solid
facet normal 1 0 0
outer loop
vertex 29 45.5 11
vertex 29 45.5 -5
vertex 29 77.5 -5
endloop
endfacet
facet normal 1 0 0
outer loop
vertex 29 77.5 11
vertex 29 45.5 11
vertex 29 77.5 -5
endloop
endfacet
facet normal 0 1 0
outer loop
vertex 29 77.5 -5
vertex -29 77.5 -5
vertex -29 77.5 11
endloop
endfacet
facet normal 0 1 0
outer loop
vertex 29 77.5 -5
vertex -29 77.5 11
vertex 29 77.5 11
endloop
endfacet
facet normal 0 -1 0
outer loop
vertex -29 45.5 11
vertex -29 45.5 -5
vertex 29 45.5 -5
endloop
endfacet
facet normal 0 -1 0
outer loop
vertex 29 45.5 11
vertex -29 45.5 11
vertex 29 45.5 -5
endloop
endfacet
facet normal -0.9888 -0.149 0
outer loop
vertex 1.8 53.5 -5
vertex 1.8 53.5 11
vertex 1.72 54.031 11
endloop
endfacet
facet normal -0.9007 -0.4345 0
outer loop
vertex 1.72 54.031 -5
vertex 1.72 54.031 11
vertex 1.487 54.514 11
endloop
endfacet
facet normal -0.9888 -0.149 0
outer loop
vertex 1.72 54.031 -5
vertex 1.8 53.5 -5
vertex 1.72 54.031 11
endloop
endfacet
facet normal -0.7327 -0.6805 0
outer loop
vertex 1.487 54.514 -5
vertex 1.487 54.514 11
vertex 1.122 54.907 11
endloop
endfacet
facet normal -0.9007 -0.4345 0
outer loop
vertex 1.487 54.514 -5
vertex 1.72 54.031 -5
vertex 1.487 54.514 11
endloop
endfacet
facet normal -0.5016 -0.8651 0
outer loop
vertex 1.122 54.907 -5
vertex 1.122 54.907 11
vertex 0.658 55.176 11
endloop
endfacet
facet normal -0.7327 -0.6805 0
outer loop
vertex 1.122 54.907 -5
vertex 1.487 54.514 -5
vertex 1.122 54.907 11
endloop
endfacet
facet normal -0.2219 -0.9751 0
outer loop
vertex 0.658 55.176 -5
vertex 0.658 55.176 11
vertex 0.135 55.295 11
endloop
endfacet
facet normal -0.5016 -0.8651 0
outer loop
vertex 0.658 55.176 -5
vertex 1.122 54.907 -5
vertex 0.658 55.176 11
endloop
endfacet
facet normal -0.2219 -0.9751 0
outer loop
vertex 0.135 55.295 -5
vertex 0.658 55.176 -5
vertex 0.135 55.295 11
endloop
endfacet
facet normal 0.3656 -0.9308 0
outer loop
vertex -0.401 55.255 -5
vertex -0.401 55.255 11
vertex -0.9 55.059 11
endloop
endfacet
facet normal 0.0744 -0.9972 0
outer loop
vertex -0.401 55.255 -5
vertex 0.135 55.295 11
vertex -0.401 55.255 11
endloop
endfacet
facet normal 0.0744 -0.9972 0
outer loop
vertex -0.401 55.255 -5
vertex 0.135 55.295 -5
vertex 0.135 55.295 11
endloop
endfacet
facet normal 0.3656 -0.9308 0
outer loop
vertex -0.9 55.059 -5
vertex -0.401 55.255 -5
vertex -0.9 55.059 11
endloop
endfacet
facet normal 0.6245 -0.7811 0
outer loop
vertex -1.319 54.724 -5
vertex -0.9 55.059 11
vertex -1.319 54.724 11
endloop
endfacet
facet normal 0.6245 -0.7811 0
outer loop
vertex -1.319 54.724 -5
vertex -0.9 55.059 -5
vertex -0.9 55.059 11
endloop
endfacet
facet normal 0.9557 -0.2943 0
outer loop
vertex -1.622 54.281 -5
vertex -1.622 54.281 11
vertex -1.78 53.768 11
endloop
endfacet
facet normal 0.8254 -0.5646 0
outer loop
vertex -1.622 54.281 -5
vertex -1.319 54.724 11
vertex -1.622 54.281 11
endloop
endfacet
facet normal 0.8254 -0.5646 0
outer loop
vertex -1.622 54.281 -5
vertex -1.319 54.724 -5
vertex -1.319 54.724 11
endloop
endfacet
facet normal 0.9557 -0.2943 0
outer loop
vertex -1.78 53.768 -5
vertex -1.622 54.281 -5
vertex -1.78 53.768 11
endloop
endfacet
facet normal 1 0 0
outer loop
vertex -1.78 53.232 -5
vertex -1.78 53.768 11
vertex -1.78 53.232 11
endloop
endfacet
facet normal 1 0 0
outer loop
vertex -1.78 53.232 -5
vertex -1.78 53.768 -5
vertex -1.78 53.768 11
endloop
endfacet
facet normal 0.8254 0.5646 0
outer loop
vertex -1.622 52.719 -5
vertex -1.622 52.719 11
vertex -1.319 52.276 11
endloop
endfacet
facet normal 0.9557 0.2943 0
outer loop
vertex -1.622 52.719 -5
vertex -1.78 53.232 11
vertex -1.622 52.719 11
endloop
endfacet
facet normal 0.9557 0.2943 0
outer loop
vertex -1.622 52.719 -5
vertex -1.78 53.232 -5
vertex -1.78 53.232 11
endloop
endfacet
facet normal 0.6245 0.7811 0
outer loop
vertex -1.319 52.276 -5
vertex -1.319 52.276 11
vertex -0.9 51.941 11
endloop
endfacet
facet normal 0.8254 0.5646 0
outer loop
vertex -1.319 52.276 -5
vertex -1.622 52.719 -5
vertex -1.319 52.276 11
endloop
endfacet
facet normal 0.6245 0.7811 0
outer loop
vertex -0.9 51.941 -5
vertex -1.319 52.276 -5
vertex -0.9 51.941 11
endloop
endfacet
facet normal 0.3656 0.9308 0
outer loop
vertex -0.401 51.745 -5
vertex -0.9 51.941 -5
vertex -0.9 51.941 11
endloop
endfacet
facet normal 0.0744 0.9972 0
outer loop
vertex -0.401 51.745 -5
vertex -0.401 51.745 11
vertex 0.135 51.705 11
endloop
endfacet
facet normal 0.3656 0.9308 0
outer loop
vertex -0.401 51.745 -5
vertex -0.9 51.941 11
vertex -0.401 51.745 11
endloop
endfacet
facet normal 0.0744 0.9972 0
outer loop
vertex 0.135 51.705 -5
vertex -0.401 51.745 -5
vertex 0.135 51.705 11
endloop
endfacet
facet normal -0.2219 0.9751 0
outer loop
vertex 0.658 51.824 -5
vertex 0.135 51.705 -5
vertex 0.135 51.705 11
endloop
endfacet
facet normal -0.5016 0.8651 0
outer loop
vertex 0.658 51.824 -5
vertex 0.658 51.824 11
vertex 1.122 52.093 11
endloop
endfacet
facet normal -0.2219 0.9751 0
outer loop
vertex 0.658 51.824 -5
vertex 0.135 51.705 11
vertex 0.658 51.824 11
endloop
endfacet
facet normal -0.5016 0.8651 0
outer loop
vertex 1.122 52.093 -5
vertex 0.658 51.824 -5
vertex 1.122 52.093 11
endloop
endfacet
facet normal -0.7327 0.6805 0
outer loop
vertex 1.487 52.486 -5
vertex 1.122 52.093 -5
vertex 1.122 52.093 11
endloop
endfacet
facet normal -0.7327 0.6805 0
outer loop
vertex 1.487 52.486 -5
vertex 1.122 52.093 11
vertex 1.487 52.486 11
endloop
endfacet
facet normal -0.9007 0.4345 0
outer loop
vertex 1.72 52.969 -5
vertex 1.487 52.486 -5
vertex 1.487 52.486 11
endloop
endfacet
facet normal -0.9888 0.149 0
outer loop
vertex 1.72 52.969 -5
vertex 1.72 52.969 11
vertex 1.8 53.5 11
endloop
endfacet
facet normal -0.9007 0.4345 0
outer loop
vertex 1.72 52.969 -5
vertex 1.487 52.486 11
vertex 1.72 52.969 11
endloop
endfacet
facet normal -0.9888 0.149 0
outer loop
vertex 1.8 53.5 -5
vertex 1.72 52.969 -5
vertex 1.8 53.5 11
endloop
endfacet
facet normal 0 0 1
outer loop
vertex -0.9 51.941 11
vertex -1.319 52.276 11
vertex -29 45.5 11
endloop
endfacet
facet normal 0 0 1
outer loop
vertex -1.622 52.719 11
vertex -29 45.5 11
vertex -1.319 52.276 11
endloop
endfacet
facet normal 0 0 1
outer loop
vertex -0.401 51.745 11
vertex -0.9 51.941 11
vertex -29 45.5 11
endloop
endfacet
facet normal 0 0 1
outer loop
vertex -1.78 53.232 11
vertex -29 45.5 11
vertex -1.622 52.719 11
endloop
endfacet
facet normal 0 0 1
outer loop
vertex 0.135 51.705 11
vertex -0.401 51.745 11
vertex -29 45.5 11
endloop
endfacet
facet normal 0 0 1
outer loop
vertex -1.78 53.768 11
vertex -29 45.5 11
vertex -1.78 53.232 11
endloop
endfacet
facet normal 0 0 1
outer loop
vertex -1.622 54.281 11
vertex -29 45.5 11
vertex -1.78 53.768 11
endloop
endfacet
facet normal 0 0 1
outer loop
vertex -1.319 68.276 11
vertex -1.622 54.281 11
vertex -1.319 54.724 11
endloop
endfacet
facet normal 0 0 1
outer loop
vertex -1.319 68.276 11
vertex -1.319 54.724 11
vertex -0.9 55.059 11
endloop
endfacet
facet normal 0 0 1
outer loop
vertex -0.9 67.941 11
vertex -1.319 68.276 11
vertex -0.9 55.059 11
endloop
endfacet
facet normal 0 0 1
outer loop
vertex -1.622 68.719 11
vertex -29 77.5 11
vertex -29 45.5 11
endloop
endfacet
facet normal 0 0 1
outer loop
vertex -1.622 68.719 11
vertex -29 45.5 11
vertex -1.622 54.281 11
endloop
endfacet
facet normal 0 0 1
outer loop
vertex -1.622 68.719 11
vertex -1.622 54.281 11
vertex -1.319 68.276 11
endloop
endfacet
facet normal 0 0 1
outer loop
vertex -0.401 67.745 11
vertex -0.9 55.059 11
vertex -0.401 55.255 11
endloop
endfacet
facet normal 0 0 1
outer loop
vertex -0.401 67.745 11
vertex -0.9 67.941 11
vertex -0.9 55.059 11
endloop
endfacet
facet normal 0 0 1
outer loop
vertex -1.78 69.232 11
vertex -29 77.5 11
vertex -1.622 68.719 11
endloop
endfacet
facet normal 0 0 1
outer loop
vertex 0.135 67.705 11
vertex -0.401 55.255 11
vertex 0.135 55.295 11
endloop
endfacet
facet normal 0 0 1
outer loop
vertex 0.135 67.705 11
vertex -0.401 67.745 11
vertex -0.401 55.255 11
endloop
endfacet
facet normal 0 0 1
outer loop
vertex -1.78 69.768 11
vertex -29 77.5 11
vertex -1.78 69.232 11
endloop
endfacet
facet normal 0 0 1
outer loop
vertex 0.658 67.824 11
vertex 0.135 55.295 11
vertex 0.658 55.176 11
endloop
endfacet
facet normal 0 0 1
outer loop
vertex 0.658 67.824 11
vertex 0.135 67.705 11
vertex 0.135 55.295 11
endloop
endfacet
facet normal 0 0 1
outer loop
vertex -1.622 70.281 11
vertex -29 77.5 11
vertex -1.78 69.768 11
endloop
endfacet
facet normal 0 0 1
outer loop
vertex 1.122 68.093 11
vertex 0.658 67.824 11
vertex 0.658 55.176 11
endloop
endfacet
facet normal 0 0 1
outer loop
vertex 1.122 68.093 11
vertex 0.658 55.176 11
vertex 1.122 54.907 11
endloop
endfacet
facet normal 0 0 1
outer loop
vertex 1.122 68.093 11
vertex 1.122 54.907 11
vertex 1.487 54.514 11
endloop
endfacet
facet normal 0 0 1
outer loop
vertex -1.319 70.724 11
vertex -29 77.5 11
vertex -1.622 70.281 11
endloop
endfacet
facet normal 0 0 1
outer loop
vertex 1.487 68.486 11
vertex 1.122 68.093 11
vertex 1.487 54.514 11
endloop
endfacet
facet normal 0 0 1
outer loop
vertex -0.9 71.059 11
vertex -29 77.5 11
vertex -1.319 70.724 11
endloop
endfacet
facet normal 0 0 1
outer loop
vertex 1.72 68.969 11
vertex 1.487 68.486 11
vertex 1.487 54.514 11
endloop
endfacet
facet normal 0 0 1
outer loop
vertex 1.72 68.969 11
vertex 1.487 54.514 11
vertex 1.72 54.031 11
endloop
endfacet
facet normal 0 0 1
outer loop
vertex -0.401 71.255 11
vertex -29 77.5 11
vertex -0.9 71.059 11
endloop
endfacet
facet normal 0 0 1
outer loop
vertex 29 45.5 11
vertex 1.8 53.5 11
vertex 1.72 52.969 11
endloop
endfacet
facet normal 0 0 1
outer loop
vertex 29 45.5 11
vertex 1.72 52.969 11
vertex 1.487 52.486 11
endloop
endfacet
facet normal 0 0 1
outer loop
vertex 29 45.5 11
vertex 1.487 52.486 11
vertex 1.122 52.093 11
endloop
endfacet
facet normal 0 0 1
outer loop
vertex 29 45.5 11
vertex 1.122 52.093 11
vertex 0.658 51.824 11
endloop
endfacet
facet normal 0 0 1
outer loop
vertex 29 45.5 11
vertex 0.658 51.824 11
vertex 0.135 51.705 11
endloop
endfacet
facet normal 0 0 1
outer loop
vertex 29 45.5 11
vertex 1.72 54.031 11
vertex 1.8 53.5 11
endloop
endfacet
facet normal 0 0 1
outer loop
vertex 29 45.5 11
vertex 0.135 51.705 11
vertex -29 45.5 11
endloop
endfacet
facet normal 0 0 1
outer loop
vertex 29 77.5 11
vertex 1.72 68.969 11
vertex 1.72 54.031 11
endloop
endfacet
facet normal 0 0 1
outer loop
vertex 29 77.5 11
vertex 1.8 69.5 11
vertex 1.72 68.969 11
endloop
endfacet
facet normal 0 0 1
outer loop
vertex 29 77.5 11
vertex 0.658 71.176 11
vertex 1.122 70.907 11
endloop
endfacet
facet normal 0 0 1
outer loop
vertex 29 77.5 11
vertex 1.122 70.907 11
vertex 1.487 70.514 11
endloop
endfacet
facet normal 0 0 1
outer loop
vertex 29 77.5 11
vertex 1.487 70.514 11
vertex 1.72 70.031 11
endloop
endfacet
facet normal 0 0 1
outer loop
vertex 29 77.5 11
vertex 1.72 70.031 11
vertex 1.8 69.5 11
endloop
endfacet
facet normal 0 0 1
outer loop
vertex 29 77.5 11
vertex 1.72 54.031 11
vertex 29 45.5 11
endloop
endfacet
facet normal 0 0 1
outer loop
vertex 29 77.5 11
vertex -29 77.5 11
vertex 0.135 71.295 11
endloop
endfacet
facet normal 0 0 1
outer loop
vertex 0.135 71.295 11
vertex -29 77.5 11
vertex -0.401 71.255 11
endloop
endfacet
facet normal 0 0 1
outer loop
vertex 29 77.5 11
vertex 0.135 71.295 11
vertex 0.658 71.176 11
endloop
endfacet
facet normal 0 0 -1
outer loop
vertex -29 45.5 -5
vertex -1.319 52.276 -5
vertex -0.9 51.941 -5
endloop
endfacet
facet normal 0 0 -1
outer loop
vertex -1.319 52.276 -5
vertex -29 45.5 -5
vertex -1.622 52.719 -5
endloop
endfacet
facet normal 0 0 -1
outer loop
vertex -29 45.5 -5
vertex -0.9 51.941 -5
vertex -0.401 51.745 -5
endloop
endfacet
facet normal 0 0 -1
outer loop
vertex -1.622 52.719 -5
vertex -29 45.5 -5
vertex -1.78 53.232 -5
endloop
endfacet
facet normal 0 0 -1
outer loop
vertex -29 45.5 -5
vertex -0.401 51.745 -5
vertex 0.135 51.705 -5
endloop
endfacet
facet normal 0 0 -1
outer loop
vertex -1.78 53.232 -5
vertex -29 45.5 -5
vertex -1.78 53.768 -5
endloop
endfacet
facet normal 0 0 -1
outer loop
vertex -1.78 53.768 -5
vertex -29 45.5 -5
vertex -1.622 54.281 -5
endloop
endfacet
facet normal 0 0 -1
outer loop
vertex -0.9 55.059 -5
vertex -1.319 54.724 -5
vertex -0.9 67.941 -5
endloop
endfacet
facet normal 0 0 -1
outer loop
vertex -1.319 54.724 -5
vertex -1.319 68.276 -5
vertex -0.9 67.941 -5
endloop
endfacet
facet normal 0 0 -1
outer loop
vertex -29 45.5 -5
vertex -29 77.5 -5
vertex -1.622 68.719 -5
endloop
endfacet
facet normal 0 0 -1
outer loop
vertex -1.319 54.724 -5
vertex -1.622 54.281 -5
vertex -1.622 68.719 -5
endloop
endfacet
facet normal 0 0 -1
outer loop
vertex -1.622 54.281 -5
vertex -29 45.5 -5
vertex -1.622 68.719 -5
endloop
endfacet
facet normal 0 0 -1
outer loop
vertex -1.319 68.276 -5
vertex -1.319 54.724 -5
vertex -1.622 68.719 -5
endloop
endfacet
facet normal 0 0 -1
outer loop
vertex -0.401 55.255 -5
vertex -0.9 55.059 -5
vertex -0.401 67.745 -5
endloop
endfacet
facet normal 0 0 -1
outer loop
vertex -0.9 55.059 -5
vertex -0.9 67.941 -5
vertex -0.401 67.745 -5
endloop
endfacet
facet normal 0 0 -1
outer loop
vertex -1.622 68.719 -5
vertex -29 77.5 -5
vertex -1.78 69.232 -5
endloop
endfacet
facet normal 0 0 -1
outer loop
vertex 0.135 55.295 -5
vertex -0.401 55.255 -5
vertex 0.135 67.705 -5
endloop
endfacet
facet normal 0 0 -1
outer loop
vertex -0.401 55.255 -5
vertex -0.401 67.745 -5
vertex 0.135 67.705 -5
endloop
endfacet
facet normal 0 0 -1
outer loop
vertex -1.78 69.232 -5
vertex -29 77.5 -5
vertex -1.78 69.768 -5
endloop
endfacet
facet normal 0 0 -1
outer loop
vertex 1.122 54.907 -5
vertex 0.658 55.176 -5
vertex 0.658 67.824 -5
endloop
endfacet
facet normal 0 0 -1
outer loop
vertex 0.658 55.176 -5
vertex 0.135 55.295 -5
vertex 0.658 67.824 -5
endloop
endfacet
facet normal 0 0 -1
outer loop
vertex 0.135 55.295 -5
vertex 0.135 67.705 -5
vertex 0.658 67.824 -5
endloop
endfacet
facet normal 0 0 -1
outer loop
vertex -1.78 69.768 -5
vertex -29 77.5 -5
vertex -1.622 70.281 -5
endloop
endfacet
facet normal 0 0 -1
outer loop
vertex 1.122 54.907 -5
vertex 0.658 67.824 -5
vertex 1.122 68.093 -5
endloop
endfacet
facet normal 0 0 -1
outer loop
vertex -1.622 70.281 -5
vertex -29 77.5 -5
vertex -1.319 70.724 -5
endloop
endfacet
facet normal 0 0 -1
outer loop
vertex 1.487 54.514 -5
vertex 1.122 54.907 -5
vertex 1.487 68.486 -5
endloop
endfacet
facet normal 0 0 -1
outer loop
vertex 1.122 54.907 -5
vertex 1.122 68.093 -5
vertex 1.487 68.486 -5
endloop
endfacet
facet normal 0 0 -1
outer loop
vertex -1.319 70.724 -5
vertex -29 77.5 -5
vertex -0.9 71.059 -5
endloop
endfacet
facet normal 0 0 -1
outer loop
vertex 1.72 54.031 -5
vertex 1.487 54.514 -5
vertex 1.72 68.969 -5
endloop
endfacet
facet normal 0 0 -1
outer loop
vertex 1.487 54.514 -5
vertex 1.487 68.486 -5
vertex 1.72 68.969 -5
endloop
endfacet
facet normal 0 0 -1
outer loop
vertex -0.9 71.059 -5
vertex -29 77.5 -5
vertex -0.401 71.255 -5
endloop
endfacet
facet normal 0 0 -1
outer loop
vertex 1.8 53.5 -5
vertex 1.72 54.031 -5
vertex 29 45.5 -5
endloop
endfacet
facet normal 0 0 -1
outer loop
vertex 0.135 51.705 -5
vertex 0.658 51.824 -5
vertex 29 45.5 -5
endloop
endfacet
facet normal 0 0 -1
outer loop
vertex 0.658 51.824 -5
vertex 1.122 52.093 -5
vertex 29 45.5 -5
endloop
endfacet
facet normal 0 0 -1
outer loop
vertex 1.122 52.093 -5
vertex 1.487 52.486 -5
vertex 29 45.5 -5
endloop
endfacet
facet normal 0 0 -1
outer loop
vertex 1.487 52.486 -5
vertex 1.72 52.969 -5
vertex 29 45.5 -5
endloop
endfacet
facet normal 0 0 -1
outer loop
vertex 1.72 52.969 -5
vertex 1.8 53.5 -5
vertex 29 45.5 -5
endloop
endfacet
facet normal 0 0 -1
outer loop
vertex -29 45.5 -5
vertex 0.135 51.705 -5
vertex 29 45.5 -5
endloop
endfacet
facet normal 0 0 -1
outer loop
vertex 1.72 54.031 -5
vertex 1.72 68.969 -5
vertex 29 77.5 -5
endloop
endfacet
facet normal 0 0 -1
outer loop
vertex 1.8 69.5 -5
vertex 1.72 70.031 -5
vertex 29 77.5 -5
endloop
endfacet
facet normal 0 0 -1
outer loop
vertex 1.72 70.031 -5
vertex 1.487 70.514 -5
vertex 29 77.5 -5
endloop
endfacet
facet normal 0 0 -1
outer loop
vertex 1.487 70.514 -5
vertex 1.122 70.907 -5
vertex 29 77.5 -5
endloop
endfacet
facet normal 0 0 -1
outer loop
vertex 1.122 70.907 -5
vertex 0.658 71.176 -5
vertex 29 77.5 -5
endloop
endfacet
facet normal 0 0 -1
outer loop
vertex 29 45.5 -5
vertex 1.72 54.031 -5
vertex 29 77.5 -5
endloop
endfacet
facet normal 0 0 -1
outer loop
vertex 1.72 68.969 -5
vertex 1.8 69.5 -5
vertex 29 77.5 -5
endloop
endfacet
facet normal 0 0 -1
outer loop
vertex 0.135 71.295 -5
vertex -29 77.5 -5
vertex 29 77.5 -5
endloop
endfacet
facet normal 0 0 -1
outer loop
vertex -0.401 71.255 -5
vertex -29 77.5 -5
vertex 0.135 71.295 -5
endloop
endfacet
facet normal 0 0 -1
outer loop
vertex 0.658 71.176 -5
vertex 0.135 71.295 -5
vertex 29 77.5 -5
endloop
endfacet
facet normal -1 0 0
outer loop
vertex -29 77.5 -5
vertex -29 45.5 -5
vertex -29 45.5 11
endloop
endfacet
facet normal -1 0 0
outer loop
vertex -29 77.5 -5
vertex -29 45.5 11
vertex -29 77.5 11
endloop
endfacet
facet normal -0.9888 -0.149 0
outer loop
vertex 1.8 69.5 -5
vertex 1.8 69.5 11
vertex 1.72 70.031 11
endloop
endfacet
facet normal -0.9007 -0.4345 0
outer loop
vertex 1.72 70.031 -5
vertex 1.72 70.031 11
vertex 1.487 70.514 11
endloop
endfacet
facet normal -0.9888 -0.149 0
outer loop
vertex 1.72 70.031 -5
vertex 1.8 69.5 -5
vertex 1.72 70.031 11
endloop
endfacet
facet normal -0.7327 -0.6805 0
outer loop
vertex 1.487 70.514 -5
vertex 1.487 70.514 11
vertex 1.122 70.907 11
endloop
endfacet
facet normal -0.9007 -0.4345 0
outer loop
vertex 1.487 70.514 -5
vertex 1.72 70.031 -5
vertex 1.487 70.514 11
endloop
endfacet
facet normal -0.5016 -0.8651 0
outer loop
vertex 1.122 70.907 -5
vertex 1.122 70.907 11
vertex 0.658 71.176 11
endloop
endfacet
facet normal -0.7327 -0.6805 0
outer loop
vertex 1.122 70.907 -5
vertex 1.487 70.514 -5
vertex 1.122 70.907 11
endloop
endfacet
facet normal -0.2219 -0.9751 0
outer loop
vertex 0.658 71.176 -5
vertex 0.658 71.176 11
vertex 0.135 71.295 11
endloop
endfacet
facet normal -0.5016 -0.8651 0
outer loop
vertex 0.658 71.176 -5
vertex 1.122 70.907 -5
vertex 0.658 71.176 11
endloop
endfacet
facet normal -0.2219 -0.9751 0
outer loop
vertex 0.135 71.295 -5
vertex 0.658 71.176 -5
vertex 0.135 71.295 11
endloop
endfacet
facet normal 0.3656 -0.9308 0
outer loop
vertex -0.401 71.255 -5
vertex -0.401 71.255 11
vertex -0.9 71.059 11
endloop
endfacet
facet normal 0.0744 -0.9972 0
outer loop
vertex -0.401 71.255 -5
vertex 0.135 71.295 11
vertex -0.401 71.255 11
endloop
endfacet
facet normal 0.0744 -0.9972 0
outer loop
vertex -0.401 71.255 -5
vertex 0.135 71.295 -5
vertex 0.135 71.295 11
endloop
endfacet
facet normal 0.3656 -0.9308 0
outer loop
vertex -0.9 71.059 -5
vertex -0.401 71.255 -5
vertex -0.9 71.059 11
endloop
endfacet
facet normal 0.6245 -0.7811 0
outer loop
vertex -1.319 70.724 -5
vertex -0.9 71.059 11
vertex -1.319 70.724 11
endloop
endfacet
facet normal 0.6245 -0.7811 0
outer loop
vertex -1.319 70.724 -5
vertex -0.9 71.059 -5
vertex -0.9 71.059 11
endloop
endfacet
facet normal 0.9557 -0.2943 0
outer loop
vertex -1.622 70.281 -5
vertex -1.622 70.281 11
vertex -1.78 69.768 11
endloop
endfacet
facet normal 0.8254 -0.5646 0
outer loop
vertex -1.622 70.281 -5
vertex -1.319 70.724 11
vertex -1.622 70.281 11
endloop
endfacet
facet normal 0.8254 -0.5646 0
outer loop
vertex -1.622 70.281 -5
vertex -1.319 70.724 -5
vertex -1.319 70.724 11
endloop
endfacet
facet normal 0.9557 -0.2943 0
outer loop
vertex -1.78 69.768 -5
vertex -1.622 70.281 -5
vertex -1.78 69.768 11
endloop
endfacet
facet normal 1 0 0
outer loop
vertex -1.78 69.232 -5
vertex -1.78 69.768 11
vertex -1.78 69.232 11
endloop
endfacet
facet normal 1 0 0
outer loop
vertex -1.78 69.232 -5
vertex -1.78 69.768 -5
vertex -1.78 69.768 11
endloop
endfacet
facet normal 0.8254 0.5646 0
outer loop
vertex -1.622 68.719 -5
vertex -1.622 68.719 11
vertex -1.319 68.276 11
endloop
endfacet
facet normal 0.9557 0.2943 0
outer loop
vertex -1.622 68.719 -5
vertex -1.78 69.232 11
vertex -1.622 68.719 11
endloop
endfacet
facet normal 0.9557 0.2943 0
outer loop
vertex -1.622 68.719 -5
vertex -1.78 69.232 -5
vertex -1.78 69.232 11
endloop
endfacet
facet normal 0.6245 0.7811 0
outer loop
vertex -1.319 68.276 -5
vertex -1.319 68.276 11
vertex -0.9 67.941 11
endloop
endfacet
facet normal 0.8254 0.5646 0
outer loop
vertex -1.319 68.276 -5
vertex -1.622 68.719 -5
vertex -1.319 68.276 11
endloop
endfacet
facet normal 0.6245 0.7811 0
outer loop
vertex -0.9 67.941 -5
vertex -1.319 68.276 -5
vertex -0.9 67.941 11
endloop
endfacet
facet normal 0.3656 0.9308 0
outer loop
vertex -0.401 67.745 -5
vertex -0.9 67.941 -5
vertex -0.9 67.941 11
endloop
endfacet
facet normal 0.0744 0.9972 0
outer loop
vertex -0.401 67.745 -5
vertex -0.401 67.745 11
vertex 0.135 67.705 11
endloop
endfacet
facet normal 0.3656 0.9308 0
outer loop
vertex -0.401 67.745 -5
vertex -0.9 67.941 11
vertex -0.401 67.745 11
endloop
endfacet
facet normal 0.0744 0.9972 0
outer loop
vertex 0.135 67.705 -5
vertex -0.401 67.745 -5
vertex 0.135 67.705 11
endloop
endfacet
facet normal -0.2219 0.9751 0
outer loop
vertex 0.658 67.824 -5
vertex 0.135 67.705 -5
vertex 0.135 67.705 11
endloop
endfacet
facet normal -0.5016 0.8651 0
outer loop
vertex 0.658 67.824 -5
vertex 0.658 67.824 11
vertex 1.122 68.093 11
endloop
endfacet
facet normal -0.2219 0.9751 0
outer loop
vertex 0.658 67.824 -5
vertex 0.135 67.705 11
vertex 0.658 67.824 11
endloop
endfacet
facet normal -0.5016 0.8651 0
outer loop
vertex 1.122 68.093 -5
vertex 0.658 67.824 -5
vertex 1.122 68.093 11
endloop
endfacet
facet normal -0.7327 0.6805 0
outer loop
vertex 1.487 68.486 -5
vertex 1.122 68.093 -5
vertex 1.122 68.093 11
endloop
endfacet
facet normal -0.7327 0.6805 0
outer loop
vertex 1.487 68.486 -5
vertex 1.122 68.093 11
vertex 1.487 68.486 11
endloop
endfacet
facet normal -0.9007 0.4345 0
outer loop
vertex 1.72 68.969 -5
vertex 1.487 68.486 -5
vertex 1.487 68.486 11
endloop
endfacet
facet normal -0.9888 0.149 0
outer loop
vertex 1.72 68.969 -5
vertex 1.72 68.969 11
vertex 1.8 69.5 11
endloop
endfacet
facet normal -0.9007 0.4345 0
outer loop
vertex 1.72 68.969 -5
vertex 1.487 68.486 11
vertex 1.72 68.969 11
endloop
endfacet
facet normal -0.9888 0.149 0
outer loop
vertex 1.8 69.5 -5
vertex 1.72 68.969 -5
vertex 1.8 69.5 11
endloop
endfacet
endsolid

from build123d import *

# Parameters (mm, degrees)
CYLINDER003_R     = 1.8
CYLINDER003_DEPTH = 50
ARRAY001_Y_COUNT  = 2
ARRAY001_Y_PITCH  = 16
BOX_W             = 58
BOX_H             = 32
BOX_DEPTH         = 16


with BuildPart() as bolt_hole_array:
    # Cylinder003 → Cylinder003 (new body)
    with BuildSketch(Plane.XY):
        Circle(CYLINDER003_R)
    extrude(amount=CYLINDER003_DEPTH)

    # Array001 Y: bolt hole array ×2


with BuildPart() as bolt_hole_array_1:
    add(bolt_hole_array.part)
    with Locations(*[(0, i * ARRAY001_Y_PITCH, 0) for i in range(1, ARRAY001_Y_COUNT)]):
        add(bolt_hole_array.part)


with BuildPart() as bolt_hole_array_2:
    # Array001 placement: moved
    add(bolt_hole_array_1.part.moved(Location((29, 8, 0))))


with BuildPart() as battery_mockup_cut:
    # Box → Box (new body)
    with BuildSketch(Plane.XY):
        with Locations((29, 16)):
            Rectangle(BOX_W, BOX_H)
    extrude(amount=BOX_DEPTH)

    # Cut002: cut bolt hole array
    add(bolt_hole_array_2.part, mode=Mode.SUBTRACT)


with BuildPart() as battery_mockup_cut_1:
    # Cut002 placement: moved
    add(battery_mockup_cut.part.moved(Location((-29, 45.5, -5))))


solid = battery_mockup_cut_1.part
